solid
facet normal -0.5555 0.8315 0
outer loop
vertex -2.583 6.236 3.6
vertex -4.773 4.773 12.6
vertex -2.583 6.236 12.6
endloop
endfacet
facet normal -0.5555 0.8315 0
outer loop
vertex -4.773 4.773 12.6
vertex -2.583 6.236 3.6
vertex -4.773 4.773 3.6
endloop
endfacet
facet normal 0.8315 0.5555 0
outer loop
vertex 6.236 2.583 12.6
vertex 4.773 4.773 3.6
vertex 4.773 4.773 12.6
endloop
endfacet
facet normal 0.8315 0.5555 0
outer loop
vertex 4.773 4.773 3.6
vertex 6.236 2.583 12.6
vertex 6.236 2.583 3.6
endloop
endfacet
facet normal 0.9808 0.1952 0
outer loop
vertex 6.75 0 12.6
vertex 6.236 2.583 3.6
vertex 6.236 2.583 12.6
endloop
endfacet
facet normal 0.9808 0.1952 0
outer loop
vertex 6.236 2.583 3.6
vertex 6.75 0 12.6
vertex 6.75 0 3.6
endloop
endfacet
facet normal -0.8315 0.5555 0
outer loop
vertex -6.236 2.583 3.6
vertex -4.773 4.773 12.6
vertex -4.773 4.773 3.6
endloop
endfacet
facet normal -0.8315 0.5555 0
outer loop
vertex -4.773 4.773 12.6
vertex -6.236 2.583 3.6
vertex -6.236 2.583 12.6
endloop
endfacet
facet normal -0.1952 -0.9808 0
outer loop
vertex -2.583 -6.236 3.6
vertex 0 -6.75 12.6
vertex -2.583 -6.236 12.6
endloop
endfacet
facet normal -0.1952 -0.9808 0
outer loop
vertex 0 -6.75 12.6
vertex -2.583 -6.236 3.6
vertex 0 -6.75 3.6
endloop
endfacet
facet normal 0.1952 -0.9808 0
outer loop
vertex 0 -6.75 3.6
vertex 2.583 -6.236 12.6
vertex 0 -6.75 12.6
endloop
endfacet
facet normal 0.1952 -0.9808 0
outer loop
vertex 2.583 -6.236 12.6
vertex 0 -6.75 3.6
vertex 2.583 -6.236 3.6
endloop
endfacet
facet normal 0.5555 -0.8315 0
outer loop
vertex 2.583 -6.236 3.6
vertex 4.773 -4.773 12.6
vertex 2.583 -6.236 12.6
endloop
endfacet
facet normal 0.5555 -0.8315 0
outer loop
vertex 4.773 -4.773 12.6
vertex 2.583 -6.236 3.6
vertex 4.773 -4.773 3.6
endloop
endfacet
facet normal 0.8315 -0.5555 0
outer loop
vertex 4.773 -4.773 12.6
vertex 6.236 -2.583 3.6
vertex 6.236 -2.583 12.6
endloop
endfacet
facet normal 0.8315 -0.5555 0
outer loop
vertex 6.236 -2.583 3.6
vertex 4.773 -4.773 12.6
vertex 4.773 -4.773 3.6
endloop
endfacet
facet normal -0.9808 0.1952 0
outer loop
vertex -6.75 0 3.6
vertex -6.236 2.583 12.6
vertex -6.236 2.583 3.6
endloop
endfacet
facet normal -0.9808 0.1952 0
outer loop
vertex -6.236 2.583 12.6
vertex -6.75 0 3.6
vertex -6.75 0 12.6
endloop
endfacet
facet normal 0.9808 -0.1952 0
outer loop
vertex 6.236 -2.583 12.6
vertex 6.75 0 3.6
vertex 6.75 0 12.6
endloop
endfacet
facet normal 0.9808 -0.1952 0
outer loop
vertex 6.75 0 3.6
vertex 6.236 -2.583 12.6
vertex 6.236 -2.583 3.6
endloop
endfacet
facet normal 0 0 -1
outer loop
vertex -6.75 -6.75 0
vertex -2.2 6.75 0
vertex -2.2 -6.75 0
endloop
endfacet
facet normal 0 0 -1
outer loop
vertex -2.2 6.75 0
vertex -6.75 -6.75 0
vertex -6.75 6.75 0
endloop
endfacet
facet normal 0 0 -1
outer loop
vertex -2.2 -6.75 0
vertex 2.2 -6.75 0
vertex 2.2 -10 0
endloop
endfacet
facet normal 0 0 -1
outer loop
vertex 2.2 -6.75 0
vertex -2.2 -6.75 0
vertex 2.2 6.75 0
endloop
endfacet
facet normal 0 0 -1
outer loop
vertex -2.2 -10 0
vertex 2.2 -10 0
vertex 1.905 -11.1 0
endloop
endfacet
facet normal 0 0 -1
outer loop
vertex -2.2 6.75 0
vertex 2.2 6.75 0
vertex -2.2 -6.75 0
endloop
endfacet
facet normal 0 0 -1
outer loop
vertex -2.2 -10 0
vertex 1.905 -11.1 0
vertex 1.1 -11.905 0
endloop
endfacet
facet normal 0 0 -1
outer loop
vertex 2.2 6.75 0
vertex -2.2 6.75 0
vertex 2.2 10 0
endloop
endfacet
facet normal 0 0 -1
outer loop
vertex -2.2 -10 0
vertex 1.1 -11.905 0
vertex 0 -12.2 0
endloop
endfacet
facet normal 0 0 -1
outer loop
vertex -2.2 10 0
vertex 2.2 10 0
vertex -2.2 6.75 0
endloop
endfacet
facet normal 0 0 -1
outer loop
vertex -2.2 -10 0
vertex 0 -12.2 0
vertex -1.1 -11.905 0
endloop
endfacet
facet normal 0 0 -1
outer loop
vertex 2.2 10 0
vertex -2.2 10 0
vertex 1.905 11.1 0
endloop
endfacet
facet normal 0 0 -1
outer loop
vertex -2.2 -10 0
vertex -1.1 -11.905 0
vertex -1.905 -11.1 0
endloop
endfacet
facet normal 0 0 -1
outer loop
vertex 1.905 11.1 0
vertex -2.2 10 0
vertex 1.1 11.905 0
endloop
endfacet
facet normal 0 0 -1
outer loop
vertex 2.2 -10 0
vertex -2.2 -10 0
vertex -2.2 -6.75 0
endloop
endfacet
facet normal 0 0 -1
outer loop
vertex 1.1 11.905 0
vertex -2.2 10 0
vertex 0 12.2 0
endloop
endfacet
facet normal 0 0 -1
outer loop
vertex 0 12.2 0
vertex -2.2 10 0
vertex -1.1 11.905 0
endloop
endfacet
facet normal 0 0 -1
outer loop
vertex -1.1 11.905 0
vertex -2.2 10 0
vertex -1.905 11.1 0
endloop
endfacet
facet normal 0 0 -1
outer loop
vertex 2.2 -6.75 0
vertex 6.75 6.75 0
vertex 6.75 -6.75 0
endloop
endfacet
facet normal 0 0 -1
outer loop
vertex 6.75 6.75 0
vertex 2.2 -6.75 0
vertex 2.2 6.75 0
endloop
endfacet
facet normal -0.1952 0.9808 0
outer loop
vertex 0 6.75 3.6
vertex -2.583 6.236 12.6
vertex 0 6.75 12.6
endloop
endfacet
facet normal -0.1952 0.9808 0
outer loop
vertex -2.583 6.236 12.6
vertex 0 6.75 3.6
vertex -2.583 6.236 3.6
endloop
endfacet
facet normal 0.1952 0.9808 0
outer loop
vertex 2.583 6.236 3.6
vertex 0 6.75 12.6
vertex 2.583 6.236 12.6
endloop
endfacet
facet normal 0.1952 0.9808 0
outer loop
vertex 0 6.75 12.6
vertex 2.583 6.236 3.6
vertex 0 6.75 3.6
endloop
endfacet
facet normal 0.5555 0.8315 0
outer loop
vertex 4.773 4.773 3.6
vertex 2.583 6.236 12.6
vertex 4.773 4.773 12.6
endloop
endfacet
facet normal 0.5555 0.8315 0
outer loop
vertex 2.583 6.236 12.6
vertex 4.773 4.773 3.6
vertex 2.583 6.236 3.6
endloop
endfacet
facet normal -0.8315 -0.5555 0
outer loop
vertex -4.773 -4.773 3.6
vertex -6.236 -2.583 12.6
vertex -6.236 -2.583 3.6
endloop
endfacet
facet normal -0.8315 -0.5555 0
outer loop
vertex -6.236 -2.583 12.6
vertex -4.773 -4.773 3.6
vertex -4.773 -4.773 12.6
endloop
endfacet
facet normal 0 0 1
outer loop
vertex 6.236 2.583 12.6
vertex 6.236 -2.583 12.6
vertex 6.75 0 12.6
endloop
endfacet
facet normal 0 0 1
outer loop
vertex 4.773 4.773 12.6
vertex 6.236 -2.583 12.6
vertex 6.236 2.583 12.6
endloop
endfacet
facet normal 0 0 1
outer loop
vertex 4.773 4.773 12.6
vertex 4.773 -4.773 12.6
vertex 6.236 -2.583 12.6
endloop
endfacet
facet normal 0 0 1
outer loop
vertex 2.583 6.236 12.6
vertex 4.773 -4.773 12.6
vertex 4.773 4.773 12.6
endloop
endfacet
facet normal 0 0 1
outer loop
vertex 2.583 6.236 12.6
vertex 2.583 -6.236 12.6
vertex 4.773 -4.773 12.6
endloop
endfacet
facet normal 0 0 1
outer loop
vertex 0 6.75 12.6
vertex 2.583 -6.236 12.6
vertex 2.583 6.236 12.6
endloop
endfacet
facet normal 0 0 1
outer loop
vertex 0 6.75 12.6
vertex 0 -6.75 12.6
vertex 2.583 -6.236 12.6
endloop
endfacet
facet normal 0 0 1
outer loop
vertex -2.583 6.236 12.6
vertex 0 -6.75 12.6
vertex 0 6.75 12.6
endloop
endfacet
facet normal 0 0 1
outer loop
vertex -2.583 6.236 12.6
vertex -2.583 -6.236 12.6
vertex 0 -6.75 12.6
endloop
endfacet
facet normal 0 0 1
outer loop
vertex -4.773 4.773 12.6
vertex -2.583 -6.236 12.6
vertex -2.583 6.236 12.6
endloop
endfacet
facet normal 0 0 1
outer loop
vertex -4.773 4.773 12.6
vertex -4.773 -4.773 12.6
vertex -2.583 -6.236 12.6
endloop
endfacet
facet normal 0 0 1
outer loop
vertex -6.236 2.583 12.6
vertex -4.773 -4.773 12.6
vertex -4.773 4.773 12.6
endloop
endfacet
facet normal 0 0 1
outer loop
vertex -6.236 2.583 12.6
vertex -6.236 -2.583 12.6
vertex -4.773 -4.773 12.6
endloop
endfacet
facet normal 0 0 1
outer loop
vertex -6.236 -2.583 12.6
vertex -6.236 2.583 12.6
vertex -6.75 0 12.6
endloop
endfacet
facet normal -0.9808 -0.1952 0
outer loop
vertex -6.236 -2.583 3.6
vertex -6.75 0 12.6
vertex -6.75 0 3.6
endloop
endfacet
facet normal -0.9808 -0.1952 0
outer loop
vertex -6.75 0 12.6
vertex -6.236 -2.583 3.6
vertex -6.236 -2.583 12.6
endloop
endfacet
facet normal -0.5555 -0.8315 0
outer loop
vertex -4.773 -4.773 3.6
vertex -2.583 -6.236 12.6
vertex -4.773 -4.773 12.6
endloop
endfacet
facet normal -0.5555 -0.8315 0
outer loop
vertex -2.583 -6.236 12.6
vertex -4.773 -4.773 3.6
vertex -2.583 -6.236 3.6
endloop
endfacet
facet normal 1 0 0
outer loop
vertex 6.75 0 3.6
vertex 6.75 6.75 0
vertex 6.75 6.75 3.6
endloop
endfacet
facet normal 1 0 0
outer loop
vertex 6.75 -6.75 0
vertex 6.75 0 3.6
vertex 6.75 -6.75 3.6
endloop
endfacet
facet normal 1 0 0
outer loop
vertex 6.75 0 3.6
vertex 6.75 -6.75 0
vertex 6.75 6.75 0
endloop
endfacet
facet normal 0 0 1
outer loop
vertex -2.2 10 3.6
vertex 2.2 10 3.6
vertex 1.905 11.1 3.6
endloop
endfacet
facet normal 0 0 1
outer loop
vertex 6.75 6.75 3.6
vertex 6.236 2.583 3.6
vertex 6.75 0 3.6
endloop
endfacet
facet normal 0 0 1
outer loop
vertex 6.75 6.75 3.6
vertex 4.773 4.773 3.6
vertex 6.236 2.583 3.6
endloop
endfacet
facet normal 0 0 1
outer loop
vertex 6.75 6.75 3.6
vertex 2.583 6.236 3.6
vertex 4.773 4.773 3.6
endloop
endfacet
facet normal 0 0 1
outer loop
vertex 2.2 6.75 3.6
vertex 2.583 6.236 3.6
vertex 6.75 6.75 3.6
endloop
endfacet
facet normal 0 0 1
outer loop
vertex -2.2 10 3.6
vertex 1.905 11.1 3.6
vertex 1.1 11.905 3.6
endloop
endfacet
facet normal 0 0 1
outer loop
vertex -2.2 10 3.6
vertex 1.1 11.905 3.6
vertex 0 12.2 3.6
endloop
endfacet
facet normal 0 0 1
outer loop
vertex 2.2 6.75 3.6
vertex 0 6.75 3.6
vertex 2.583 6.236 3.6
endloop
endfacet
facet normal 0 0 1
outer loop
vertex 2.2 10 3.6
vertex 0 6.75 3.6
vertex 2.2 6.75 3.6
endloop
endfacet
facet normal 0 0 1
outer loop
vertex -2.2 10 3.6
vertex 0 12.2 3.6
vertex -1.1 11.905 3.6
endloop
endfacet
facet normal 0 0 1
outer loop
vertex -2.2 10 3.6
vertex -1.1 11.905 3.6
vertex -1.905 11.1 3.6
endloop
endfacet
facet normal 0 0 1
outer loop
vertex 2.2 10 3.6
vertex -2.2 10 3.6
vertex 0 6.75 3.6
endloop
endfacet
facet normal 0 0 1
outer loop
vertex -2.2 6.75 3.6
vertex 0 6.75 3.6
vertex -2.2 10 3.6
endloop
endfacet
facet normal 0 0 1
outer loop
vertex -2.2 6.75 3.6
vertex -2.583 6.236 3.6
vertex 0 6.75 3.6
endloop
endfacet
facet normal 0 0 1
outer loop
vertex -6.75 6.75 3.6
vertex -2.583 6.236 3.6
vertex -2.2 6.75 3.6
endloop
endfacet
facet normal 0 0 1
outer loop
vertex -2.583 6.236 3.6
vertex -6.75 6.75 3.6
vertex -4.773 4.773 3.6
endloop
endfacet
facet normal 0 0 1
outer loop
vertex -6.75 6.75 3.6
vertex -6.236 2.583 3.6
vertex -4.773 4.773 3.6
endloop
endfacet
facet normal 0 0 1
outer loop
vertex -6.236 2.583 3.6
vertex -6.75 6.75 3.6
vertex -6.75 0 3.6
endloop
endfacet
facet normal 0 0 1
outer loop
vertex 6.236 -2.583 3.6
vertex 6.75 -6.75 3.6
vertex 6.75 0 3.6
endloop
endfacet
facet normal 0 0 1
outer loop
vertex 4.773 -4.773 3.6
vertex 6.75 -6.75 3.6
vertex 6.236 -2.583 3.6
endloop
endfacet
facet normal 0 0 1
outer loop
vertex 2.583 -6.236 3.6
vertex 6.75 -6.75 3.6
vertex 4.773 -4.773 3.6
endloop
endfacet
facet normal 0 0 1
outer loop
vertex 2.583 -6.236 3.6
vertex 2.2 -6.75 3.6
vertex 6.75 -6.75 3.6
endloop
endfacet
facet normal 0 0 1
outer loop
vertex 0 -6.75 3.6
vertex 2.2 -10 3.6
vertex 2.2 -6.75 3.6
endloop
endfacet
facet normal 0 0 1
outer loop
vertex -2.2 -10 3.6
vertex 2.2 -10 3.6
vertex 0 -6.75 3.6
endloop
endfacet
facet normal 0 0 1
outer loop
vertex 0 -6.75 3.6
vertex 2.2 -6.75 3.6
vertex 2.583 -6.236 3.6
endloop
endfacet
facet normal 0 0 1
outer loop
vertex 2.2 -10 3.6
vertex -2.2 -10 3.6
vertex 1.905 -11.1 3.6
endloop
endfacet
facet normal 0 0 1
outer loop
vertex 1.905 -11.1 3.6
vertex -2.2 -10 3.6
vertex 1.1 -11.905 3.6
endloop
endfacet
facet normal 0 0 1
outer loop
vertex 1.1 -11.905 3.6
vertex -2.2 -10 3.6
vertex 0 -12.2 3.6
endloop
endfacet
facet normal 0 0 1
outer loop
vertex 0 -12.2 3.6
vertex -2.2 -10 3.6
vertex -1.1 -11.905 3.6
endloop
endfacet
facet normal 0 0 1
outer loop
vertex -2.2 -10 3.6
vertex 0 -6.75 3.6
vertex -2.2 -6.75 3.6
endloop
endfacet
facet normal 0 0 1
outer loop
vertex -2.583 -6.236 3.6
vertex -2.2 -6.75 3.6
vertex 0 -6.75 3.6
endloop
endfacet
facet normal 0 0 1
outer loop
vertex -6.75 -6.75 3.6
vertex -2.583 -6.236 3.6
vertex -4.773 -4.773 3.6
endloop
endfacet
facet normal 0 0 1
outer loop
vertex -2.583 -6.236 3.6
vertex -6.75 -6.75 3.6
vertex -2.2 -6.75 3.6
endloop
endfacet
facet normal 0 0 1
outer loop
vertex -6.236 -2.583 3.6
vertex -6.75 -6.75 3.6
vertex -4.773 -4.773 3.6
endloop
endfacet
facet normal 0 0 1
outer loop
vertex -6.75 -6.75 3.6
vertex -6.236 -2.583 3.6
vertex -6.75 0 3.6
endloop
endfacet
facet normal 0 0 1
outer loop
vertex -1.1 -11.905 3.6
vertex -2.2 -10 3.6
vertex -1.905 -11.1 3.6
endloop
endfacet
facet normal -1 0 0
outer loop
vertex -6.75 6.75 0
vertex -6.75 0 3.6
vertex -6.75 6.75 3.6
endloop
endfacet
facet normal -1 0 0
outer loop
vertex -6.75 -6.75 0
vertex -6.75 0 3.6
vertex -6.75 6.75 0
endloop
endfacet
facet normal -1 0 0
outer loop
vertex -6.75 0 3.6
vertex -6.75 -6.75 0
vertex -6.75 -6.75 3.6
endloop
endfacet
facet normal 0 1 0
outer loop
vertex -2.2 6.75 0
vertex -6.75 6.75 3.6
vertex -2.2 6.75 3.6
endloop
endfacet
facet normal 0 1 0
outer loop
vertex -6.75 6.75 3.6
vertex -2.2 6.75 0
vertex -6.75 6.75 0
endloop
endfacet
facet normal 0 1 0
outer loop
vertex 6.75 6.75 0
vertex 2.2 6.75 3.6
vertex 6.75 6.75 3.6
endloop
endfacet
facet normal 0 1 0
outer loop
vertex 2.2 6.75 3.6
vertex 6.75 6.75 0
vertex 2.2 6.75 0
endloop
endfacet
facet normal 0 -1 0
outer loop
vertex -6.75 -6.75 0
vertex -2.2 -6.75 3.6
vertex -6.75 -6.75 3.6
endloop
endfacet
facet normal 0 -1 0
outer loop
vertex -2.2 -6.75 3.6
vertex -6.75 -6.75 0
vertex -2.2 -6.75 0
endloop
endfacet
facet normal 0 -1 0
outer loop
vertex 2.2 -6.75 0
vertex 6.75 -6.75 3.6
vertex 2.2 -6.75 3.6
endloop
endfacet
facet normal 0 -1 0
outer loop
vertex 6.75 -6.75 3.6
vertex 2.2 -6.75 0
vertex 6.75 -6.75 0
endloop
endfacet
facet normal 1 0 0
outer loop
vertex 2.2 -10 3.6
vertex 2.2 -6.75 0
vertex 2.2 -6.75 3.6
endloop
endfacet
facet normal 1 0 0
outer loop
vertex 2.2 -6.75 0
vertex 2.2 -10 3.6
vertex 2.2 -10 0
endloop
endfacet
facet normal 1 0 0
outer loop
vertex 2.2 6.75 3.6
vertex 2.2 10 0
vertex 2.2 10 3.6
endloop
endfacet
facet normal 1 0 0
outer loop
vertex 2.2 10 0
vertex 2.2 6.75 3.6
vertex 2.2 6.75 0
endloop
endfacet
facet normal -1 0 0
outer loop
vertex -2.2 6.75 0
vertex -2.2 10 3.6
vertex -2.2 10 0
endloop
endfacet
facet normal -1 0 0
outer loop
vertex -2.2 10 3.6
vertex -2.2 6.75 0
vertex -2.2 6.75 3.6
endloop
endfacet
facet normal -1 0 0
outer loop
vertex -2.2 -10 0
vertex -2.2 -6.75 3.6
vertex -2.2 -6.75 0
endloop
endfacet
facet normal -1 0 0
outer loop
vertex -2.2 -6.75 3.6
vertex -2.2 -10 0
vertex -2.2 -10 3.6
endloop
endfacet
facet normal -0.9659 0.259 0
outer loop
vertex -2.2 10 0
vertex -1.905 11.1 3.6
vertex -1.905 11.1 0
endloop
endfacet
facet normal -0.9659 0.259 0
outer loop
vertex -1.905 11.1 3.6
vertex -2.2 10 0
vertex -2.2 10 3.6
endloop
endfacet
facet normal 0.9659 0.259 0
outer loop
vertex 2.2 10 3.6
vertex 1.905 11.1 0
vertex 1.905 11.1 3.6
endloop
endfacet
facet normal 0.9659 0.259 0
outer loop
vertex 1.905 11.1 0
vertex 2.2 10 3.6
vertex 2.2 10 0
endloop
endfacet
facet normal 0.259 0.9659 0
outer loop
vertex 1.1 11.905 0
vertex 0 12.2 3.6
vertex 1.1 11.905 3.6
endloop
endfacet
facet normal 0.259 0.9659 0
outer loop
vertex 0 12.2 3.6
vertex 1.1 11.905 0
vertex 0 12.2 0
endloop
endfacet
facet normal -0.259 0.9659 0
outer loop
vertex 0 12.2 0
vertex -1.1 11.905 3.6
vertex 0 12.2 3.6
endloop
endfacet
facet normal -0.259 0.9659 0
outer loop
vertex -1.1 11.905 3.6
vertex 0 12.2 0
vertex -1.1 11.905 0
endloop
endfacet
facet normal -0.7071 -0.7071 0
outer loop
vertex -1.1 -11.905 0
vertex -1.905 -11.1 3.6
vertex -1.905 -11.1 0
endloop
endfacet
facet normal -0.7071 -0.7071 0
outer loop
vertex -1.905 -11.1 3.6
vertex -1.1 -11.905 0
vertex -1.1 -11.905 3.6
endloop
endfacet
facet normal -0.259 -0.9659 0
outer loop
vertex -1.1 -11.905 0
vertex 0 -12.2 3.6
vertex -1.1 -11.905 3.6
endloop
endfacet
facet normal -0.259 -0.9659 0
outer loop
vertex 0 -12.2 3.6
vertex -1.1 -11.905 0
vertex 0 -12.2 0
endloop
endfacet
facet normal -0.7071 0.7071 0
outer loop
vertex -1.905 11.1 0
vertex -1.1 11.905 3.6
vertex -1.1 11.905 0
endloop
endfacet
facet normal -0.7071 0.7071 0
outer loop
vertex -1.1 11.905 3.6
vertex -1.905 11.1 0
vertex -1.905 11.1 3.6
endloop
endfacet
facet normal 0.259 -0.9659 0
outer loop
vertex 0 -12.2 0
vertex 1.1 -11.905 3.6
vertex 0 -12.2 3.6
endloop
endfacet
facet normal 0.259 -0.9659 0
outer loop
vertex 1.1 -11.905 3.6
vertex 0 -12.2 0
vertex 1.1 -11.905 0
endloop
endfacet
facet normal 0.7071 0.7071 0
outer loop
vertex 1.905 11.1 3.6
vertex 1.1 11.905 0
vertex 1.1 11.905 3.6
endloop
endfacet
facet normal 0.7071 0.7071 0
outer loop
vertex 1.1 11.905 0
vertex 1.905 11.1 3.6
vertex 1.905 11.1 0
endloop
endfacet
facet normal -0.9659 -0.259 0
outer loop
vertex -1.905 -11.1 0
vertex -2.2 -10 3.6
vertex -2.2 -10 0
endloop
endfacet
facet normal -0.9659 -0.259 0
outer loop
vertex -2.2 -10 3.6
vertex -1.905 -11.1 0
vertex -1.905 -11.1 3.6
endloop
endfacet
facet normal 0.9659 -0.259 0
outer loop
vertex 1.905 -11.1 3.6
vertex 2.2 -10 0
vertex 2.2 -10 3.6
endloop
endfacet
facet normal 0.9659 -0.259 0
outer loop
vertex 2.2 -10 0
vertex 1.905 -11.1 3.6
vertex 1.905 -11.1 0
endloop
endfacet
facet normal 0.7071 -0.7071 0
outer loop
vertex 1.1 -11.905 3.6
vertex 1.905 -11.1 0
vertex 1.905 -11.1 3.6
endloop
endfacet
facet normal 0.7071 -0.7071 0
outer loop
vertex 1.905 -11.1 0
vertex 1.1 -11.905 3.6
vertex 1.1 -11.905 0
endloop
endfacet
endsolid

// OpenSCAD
// file: ../libdict.scad
// This library add dictionary like features to openscad
// the dictionary is a list of pairs as we cannot define new types.
// Unlike a python dictionary we cannot do a proper hash table for speed
// so everything is build around the OpenSCAD search function
// There are a lot of assert statements to ensure data in the "dictionary"
// is in the format of
// * A list of lists
// * Each internal list has a length of two
// * First element of each internal list is a string (the key)
// * All keys are unique.


// Private function:
// This function returns true if the value is in the list
// value must be a string.
// No error checking, for use by is_in only!
function _is_in_str(value, list) =
    search([value], list) != [[]];

// Private function:
// This function returns true if the value is in the list
// value must be a number.
// No error checking, for use by is_in only!
function _is_in_num(value, list) =
    search(value, list) != [];


// This function returns true if the value is in the list
// value must be a string or a number.
function is_in(value, list) =
    assert(is_num(value) || is_string(value) , "is_in: value must be a number or string")
    assert(is_list(list), "is_in: list must be a list")
    is_num(value) ? _is_in_num(value, list) : _is_in_str(value, list);

/**
 * Sum a list
 * This recursive function sums a list.  It should be called with one
 * argument (the list); the other two arguments simply allow it to be
 * "tail-recursive" which lets OpenSCAD optimise it better.  This is
 * very close to the example given in the OpenSCAD docs.
 */
function _libdict_sum_list(list, starting_element=0, running_total=0) =
    starting_element >= len(list) ?
        running_total :
        _libdict_sum_list(list, starting_element + 1, running_total + list[starting_element]);

/**
 * When checking a list for uniqueness, we can get "errant matches".
 * An errant match is when a non-list matches with the first element in a list.
 * i.e. it would consider [1, [1,0]] to be non-unique. We cannot know which 
 * element is the non-list but we do know that it is errant if exactly one 
 * of them is not a list.
 * If two elements are non-lists, they must be identical in order to have matched.  
 * Similarly, if all elements are lists, they must be identical because ``search`` 
 * will have matched them as whole lists.
 * The argument "list" is the list we are checking for uniqueness, and "match" is 
 * a vector of indices that have been returned by ``search``.
 */
function _check_errant_match(list, match) = let(
    non_list = [for (m = match) is_list(list[m])? 0 : 1],
    number_of_non_lists = _libdict_sum_list(non_list)
) number_of_non_lists == 1 ? 0 : 1;

// Returns true if all emements in list are unique.
function is_unique(list) =
    assert(is_list(list), "is_unique: list must be a list")
    let(
        matches = search(list, list, 0),
        // Assign 1 or 0 depending on is the match length for each element
        // return wether any matches are greater than one (mathcing more than
        // itself)
        // note cannot search for true or false so using 1 and zero
        bool_list = [for (match = matches) if (len(match)==1) 0
            // should put a 1 here to show they matched but in the case of
            // [1, [1]] it will match both, so need to check if they are
            // both lists or both not list
            else _check_errant_match(list, match)]
    ) !is_in(1, bool_list);

// Private function:
// Checks that the input is a list and that every element is a list
// of length 2.
// No error checking, for use by valid_dict only!
function _is_pairs(list) =
    !is_list(list) ? false :
        !is_in(0, [for (pair = list) is_list(pair) && len(pair)==2 ? 1: 0]);

// Private function:
// Checks all elements in the list are strings
// No error checking, for use by valid_dict only!
// Strings can't be empty
function _is_list_of_strings(list) =
    !is_in(0, [for (item = list) is_string(item) && len(item)>0 ? 1: 0]);

// Private function:
// Returns the keus in a dictionary
// No error checking, for use by valid_dict only!
function _keylist(dict)  = [for (pair=dict) pair[0]];

function valid_dict(dict) =
    //if the input are not pairs return instantly
    !_is_pairs(dict) ? false : let (
        //if they are pairs get all keys
        keys = _keylist(dict),
        all_strings =  _is_list_of_strings(keys),
        unique = is_unique(keys)
    ) (all_strings && unique) ? true : false;

// Key lookup for key value pair "dictionary".
// Unlike the built in lookup this works with strings.
function key_lookup(key, dict) =
    assert(is_string(key), "`key` must be a string")
    assert(valid_dict(dict), "`dict` must be a valid 'dictionary'")
    let(
        // key is in [] because otherwise openscad will search for each letter rather than the string.
        index = search([key], dict, 1, 0)[0]
    )  assert (index!=[], "Key lookup failed, key not found!") dict[index][1];

// Creates a new dictionary with a key value pair replaced. Pair must already
// be in dictionary.
function replace_value(key, value, dict) =
    assert(is_string(key), "`key` must be a string")
    assert(valid_dict(dict), "`dict` must be a valid 'dictionary'")
    assert(is_in(key, _keylist(dict)), "`key` not found in dictionary!")
    [for (kv_pair = dict) key!=kv_pair[0] ? kv_pair : [key, value]];


// Creates a new dictionary with a a set of key value pair replaced
// both inputs must be a dictionary. All keys in input must already be
// in dictionary
function replace_multiple_values(rep_dict, dict) =
    assert(valid_dict(rep_dict), "`rep dict` must be a valid 'dictionary'")
    assert(valid_dict(dict), "`dict` must be a valid 'dictionary'")
    let(
        // loop over all keys in replacement dict checking they are in the original
        rep_keys = [for (key = _keylist(rep_dict))
            assert(is_in(key, _keylist(dict)), "`key` not found in dictionary!")
            key
        ]
    ) //Finally return the updated dictionary using this long list comprehension.
    [
        for (kv_pair = dict) let(
            key = kv_pair[0],
            // check if this key is in the replacement dictionary and if so return index
            // key is in [] because otherwise openscad will search for each letter rather
            // than the string.
            index = search([key], rep_dict, 1, 0)[0]
            // if index is empty return original key value pair, else return the key with
            // the replaced value
        ) index == [] ? kv_pair : [key, rep_dict[index][1]]
    ];
// main file
/******************************************************************
*                                                                 *
* OpenFlexure Microscope: OpenMV camera mount                     *
*                                                                 *
* This is part of the OpenFlexure microscope, an open-source      *
* microscope and 3-axis translation stage.  It gets really good   *
* precision over a ~10mm range, by using plastic flexure          *
* mechanisms.                                                     *
*                                                                 *
* (c) Kaizhi SingTown, 2024                                       *
* Released under the CERN Open Hardware License                   *
*                                                                 *
******************************************************************/


use <../utilities.scad>
use <../libdict.scad>


/**
* y-position of the lugs for mounting screws
*/
function m12_lens_holder_mounting_screw_y() = 10;
/**
* Radius of the mounting lugs
*/
function m12_lens_holder_mounting_screw_lug_r() = 2.2;


$fn=32;

function omv_m12_camera_dict() = [["mount_height", 4],
                              ["sensor_height", 0.5]];//Height of the sensor above the PCB

module omv_m12_lens_mount(){
    // the tube into which the lens screws
    lens_holder_tube_r = 13.5/2;
    // the height of the tube above the PCB
    lens_holder_tube_h = 12.6;
    lens_holder_box_h = 3.6;
    // box at the bottom of the tube
    lens_holder_box = [2,2,0] * lens_holder_tube_r + [0,0,1] * lens_holder_box_h;

    union(){
        cylinder(r=lens_holder_tube_r, h=lens_holder_tube_h, $fn=16);
        translate_z(lens_holder_box_h/2){
            cube(lens_holder_box, center=true);
        }
        hull(){
            reflect_y(){
                translate_y(m12_lens_holder_mounting_screw_y()){
                    cylinder(r=m12_lens_holder_mounting_screw_lug_r(), h=lens_holder_box_h, $fn=12);
                }
            }
        }
    }

}
omv_m12_lens_mount();

module omv_m12_camera_mount(){
    h = key_lookup("mount_height", omv_m12_camera_dict());
    sy = m12_lens_holder_mounting_screw_y();
    sr = m12_lens_holder_mounting_screw_lug_r()+0.5;
    box_w = 17;
    sensor_w = 14;
    solder_w = (box_w-1.2*2);
    translate_z(-h){
        difference(){
            linear_extrude(h+tiny()){
                difference(){
                    union(){
                        square(box_w, center=true);
                        hull(){
                            reflect([1,0]){
                                translate([sy,0]){
                                    circle(r=sr, $fn=16);
                                }
                            }
                        }
                    }
                    //screws
                    reflect([1,0]){
                        translate([sy,0]){
                            circle(d=1.5, $fn=16);
                        }
                    }
                }
            }
            cube([sensor_w, sensor_w, 2],center=true);
            sequential_hull(){
                translate_z(0.7){
                    cube([solder_w,solder_w,tiny()],center=true);
                }
                translate_z(0.7+(solder_w-sensor_w)/2){
                    cube([sensor_w, sensor_w, tiny()],center=true);
                }
                translate_z(2){
                    cube([sensor_w, sensor_w, tiny()],center=true);
                }
                translate_z(h+tiny()){
                    cylinder(r=5,h=tiny());
                }
            }
        }
    }
}
